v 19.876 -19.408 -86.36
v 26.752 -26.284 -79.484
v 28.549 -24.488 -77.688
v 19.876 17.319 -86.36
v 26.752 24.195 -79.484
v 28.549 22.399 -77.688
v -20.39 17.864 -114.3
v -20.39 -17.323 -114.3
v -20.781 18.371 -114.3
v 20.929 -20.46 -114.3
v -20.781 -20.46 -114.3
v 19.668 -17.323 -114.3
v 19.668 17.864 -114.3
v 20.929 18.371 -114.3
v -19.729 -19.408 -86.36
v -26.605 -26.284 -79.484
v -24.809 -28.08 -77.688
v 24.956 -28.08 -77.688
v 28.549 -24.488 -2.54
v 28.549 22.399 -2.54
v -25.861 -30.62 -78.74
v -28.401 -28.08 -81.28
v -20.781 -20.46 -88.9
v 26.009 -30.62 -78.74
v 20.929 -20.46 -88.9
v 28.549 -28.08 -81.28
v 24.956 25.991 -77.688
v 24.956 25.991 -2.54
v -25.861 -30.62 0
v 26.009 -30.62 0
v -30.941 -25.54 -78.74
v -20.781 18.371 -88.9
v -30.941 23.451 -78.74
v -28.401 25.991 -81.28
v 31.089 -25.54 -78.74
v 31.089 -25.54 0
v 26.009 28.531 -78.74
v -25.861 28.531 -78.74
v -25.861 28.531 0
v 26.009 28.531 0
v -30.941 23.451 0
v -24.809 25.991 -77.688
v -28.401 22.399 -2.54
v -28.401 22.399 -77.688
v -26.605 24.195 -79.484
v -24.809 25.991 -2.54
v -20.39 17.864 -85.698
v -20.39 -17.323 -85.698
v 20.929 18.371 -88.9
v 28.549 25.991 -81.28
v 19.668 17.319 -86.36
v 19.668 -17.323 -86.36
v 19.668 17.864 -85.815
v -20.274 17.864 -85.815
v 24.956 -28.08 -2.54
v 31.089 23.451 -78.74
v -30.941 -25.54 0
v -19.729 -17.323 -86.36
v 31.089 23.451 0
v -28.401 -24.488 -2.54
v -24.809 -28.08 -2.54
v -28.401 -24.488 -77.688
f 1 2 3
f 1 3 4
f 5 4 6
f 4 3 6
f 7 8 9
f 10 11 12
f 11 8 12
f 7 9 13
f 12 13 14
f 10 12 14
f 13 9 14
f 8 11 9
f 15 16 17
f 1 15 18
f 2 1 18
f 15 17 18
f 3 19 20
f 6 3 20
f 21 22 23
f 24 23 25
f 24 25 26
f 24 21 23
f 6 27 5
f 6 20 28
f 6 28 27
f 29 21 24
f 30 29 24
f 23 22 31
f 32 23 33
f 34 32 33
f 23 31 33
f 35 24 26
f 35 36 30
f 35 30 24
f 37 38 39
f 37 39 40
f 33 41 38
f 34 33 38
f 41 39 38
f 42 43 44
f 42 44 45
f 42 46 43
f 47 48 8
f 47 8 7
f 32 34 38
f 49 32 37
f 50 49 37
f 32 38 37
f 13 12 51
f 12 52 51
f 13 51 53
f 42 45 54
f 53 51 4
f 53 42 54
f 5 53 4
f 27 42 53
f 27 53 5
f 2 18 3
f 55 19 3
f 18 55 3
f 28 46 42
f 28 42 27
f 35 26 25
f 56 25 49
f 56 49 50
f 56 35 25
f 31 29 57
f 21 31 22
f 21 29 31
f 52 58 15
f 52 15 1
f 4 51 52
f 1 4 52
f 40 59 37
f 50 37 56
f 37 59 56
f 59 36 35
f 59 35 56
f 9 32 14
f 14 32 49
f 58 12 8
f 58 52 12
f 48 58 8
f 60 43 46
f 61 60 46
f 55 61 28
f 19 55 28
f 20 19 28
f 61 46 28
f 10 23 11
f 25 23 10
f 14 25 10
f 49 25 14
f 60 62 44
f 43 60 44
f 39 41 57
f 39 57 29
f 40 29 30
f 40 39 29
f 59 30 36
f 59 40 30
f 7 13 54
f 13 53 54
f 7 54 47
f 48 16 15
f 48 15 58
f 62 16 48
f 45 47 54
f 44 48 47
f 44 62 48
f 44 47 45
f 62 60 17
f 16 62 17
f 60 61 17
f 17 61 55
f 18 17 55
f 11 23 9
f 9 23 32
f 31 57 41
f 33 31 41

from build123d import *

# Parameters (mm, degrees)
F0_W     = 62.0293021202
F0_H     = 59.1503232718
F1_DEPTH = 88.9
F2_W     = 40.0586724281
F2_H     = 35.1866781712
F3_DEPTH = 76.2
F4_SIZE  = 5.08
F5_SIZE  = 10.16
F6_T     = 2.54
F7_DEPTH = 25.4


# Not quite as in the source:
# - a shell that OpenCascade refuses in one call is made with other operations: the cavity is built on its own and cut out


with BuildPart() as f1:
    # F0 (on Top) → F1 (new body)
    with BuildSketch(Plane.XY):
        with Locations((0.0738501549, -1.0445043445)):
            Rectangle(F0_W, F0_H)
    extrude(amount=-F1_DEPTH)

    # F2 (on face) → F3 (cut, symmetric)
    with BuildSketch(Plane(origin=(0, 0, -88.9), x_dir=(1, 0, 0), z_dir=(0, 0, -1))):
        with Locations((-0.360891223, -0.2706944942)):
            Rectangle(F2_W, F2_H)
    extrude(amount=F3_DEPTH, both=True, mode=Mode.SUBTRACT)

    # F4
    f4_edges = [f1.edges().sort_by_distance(p)[0] for p in [
        (-30.940801, 28.530657, -44.45),
        (31.088501, 28.530657, -44.45),
        (31.088501, -30.619666, -44.45),
        (-30.940801, -30.619666, -44.45),
    ]]
    chamfer(f4_edges, length=F4_SIZE)

    # F5 (call 1 of 4: OpenCascade refuses the feature's edges together)
    f5_edges = [f1.edges().sort_by_distance(p)[0] for p in [
        (0.07385, -30.619666, -88.9),
    ]]
    chamfer(f5_edges, length=F5_SIZE)

    # F5#2 (call 2 of 4)
    f5_2_edges = [f1.edges().sort_by_distance(p)[0] for p in [
        (0.07385, 28.530657, -88.9),
    ]]
    chamfer(f5_2_edges, length=F5_SIZE)

    # F5#3 (call 3 of 4)
    f5_3_edges = [f1.edges().sort_by_distance(p)[0] for p in [
        (31.088501, -1.044504, -88.9),
    ]]
    chamfer(f5_3_edges, length=F5_SIZE)

    # F5#4 (call 4 of 4)
    f5_4_edges = [f1.edges().sort_by_distance(p)[0] for p in [
        (-30.940801, -1.044504, -88.9),
    ]]
    chamfer(f5_4_edges, length=F5_SIZE)

    # F6: shell of thickness 2.54, made by hand


with BuildPart() as f6_core1:
    # F6_t2: copy of F1
    add(f1.part)

    # the walls: a layer under each face that stays
    f6_faces = [f6_core1.faces().sort_by_distance(p)[0] for p in [
        (0.0738501549, 23.4506572914, -83.82),
        (-17.8015650395, -17.6860714609, -88.9),
        (-25.8608009052, -1.0445043445, -83.82),
        (26.008501215, -1.0445043445, -83.82),
        (-28.4008009052, 25.9906572914, -40.64),
        (28.548501215, 25.9906572914, -40.64),
        (0.0738501549, 28.5306572914, -39.37),
        (0.0738501549, -25.5396659803, -83.82),
        (-30.9408009052, -1.0445043445, -39.37),
        (-28.4008009052, -28.0796659803, -40.64),
        (28.548501215, -28.0796659803, -40.64),
        (31.088501215, -1.0445043445, -39.37),
        (0.0738501549, -1.0445043445, 0),
        (0.0738501549, -30.6196659803, -39.37),
    ]]
    thicken(f6_faces, amount=-F6_T, mode=Mode.SUBTRACT)


with BuildPart() as f1_1:
    add(f1.part)

    # what is left inside the walls is the cavity
    f6_cavity = [f6_core1.part.solids().sort_by_distance(p)[0] for p in [
        (0.07385, 25.965257, -52.638598),
    ]]
    add(f6_cavity, mode=Mode.SUBTRACT)

    # F7 (add): a face of the model
    f7_faces = [f1_1.faces().sort_by_distance(p)[0] for p in [
        (0.0738501549, 18.3136708028, -88.9),
    ]]
    extrude(f7_faces, amount=F7_DEPTH)


solid = f1_1.part
